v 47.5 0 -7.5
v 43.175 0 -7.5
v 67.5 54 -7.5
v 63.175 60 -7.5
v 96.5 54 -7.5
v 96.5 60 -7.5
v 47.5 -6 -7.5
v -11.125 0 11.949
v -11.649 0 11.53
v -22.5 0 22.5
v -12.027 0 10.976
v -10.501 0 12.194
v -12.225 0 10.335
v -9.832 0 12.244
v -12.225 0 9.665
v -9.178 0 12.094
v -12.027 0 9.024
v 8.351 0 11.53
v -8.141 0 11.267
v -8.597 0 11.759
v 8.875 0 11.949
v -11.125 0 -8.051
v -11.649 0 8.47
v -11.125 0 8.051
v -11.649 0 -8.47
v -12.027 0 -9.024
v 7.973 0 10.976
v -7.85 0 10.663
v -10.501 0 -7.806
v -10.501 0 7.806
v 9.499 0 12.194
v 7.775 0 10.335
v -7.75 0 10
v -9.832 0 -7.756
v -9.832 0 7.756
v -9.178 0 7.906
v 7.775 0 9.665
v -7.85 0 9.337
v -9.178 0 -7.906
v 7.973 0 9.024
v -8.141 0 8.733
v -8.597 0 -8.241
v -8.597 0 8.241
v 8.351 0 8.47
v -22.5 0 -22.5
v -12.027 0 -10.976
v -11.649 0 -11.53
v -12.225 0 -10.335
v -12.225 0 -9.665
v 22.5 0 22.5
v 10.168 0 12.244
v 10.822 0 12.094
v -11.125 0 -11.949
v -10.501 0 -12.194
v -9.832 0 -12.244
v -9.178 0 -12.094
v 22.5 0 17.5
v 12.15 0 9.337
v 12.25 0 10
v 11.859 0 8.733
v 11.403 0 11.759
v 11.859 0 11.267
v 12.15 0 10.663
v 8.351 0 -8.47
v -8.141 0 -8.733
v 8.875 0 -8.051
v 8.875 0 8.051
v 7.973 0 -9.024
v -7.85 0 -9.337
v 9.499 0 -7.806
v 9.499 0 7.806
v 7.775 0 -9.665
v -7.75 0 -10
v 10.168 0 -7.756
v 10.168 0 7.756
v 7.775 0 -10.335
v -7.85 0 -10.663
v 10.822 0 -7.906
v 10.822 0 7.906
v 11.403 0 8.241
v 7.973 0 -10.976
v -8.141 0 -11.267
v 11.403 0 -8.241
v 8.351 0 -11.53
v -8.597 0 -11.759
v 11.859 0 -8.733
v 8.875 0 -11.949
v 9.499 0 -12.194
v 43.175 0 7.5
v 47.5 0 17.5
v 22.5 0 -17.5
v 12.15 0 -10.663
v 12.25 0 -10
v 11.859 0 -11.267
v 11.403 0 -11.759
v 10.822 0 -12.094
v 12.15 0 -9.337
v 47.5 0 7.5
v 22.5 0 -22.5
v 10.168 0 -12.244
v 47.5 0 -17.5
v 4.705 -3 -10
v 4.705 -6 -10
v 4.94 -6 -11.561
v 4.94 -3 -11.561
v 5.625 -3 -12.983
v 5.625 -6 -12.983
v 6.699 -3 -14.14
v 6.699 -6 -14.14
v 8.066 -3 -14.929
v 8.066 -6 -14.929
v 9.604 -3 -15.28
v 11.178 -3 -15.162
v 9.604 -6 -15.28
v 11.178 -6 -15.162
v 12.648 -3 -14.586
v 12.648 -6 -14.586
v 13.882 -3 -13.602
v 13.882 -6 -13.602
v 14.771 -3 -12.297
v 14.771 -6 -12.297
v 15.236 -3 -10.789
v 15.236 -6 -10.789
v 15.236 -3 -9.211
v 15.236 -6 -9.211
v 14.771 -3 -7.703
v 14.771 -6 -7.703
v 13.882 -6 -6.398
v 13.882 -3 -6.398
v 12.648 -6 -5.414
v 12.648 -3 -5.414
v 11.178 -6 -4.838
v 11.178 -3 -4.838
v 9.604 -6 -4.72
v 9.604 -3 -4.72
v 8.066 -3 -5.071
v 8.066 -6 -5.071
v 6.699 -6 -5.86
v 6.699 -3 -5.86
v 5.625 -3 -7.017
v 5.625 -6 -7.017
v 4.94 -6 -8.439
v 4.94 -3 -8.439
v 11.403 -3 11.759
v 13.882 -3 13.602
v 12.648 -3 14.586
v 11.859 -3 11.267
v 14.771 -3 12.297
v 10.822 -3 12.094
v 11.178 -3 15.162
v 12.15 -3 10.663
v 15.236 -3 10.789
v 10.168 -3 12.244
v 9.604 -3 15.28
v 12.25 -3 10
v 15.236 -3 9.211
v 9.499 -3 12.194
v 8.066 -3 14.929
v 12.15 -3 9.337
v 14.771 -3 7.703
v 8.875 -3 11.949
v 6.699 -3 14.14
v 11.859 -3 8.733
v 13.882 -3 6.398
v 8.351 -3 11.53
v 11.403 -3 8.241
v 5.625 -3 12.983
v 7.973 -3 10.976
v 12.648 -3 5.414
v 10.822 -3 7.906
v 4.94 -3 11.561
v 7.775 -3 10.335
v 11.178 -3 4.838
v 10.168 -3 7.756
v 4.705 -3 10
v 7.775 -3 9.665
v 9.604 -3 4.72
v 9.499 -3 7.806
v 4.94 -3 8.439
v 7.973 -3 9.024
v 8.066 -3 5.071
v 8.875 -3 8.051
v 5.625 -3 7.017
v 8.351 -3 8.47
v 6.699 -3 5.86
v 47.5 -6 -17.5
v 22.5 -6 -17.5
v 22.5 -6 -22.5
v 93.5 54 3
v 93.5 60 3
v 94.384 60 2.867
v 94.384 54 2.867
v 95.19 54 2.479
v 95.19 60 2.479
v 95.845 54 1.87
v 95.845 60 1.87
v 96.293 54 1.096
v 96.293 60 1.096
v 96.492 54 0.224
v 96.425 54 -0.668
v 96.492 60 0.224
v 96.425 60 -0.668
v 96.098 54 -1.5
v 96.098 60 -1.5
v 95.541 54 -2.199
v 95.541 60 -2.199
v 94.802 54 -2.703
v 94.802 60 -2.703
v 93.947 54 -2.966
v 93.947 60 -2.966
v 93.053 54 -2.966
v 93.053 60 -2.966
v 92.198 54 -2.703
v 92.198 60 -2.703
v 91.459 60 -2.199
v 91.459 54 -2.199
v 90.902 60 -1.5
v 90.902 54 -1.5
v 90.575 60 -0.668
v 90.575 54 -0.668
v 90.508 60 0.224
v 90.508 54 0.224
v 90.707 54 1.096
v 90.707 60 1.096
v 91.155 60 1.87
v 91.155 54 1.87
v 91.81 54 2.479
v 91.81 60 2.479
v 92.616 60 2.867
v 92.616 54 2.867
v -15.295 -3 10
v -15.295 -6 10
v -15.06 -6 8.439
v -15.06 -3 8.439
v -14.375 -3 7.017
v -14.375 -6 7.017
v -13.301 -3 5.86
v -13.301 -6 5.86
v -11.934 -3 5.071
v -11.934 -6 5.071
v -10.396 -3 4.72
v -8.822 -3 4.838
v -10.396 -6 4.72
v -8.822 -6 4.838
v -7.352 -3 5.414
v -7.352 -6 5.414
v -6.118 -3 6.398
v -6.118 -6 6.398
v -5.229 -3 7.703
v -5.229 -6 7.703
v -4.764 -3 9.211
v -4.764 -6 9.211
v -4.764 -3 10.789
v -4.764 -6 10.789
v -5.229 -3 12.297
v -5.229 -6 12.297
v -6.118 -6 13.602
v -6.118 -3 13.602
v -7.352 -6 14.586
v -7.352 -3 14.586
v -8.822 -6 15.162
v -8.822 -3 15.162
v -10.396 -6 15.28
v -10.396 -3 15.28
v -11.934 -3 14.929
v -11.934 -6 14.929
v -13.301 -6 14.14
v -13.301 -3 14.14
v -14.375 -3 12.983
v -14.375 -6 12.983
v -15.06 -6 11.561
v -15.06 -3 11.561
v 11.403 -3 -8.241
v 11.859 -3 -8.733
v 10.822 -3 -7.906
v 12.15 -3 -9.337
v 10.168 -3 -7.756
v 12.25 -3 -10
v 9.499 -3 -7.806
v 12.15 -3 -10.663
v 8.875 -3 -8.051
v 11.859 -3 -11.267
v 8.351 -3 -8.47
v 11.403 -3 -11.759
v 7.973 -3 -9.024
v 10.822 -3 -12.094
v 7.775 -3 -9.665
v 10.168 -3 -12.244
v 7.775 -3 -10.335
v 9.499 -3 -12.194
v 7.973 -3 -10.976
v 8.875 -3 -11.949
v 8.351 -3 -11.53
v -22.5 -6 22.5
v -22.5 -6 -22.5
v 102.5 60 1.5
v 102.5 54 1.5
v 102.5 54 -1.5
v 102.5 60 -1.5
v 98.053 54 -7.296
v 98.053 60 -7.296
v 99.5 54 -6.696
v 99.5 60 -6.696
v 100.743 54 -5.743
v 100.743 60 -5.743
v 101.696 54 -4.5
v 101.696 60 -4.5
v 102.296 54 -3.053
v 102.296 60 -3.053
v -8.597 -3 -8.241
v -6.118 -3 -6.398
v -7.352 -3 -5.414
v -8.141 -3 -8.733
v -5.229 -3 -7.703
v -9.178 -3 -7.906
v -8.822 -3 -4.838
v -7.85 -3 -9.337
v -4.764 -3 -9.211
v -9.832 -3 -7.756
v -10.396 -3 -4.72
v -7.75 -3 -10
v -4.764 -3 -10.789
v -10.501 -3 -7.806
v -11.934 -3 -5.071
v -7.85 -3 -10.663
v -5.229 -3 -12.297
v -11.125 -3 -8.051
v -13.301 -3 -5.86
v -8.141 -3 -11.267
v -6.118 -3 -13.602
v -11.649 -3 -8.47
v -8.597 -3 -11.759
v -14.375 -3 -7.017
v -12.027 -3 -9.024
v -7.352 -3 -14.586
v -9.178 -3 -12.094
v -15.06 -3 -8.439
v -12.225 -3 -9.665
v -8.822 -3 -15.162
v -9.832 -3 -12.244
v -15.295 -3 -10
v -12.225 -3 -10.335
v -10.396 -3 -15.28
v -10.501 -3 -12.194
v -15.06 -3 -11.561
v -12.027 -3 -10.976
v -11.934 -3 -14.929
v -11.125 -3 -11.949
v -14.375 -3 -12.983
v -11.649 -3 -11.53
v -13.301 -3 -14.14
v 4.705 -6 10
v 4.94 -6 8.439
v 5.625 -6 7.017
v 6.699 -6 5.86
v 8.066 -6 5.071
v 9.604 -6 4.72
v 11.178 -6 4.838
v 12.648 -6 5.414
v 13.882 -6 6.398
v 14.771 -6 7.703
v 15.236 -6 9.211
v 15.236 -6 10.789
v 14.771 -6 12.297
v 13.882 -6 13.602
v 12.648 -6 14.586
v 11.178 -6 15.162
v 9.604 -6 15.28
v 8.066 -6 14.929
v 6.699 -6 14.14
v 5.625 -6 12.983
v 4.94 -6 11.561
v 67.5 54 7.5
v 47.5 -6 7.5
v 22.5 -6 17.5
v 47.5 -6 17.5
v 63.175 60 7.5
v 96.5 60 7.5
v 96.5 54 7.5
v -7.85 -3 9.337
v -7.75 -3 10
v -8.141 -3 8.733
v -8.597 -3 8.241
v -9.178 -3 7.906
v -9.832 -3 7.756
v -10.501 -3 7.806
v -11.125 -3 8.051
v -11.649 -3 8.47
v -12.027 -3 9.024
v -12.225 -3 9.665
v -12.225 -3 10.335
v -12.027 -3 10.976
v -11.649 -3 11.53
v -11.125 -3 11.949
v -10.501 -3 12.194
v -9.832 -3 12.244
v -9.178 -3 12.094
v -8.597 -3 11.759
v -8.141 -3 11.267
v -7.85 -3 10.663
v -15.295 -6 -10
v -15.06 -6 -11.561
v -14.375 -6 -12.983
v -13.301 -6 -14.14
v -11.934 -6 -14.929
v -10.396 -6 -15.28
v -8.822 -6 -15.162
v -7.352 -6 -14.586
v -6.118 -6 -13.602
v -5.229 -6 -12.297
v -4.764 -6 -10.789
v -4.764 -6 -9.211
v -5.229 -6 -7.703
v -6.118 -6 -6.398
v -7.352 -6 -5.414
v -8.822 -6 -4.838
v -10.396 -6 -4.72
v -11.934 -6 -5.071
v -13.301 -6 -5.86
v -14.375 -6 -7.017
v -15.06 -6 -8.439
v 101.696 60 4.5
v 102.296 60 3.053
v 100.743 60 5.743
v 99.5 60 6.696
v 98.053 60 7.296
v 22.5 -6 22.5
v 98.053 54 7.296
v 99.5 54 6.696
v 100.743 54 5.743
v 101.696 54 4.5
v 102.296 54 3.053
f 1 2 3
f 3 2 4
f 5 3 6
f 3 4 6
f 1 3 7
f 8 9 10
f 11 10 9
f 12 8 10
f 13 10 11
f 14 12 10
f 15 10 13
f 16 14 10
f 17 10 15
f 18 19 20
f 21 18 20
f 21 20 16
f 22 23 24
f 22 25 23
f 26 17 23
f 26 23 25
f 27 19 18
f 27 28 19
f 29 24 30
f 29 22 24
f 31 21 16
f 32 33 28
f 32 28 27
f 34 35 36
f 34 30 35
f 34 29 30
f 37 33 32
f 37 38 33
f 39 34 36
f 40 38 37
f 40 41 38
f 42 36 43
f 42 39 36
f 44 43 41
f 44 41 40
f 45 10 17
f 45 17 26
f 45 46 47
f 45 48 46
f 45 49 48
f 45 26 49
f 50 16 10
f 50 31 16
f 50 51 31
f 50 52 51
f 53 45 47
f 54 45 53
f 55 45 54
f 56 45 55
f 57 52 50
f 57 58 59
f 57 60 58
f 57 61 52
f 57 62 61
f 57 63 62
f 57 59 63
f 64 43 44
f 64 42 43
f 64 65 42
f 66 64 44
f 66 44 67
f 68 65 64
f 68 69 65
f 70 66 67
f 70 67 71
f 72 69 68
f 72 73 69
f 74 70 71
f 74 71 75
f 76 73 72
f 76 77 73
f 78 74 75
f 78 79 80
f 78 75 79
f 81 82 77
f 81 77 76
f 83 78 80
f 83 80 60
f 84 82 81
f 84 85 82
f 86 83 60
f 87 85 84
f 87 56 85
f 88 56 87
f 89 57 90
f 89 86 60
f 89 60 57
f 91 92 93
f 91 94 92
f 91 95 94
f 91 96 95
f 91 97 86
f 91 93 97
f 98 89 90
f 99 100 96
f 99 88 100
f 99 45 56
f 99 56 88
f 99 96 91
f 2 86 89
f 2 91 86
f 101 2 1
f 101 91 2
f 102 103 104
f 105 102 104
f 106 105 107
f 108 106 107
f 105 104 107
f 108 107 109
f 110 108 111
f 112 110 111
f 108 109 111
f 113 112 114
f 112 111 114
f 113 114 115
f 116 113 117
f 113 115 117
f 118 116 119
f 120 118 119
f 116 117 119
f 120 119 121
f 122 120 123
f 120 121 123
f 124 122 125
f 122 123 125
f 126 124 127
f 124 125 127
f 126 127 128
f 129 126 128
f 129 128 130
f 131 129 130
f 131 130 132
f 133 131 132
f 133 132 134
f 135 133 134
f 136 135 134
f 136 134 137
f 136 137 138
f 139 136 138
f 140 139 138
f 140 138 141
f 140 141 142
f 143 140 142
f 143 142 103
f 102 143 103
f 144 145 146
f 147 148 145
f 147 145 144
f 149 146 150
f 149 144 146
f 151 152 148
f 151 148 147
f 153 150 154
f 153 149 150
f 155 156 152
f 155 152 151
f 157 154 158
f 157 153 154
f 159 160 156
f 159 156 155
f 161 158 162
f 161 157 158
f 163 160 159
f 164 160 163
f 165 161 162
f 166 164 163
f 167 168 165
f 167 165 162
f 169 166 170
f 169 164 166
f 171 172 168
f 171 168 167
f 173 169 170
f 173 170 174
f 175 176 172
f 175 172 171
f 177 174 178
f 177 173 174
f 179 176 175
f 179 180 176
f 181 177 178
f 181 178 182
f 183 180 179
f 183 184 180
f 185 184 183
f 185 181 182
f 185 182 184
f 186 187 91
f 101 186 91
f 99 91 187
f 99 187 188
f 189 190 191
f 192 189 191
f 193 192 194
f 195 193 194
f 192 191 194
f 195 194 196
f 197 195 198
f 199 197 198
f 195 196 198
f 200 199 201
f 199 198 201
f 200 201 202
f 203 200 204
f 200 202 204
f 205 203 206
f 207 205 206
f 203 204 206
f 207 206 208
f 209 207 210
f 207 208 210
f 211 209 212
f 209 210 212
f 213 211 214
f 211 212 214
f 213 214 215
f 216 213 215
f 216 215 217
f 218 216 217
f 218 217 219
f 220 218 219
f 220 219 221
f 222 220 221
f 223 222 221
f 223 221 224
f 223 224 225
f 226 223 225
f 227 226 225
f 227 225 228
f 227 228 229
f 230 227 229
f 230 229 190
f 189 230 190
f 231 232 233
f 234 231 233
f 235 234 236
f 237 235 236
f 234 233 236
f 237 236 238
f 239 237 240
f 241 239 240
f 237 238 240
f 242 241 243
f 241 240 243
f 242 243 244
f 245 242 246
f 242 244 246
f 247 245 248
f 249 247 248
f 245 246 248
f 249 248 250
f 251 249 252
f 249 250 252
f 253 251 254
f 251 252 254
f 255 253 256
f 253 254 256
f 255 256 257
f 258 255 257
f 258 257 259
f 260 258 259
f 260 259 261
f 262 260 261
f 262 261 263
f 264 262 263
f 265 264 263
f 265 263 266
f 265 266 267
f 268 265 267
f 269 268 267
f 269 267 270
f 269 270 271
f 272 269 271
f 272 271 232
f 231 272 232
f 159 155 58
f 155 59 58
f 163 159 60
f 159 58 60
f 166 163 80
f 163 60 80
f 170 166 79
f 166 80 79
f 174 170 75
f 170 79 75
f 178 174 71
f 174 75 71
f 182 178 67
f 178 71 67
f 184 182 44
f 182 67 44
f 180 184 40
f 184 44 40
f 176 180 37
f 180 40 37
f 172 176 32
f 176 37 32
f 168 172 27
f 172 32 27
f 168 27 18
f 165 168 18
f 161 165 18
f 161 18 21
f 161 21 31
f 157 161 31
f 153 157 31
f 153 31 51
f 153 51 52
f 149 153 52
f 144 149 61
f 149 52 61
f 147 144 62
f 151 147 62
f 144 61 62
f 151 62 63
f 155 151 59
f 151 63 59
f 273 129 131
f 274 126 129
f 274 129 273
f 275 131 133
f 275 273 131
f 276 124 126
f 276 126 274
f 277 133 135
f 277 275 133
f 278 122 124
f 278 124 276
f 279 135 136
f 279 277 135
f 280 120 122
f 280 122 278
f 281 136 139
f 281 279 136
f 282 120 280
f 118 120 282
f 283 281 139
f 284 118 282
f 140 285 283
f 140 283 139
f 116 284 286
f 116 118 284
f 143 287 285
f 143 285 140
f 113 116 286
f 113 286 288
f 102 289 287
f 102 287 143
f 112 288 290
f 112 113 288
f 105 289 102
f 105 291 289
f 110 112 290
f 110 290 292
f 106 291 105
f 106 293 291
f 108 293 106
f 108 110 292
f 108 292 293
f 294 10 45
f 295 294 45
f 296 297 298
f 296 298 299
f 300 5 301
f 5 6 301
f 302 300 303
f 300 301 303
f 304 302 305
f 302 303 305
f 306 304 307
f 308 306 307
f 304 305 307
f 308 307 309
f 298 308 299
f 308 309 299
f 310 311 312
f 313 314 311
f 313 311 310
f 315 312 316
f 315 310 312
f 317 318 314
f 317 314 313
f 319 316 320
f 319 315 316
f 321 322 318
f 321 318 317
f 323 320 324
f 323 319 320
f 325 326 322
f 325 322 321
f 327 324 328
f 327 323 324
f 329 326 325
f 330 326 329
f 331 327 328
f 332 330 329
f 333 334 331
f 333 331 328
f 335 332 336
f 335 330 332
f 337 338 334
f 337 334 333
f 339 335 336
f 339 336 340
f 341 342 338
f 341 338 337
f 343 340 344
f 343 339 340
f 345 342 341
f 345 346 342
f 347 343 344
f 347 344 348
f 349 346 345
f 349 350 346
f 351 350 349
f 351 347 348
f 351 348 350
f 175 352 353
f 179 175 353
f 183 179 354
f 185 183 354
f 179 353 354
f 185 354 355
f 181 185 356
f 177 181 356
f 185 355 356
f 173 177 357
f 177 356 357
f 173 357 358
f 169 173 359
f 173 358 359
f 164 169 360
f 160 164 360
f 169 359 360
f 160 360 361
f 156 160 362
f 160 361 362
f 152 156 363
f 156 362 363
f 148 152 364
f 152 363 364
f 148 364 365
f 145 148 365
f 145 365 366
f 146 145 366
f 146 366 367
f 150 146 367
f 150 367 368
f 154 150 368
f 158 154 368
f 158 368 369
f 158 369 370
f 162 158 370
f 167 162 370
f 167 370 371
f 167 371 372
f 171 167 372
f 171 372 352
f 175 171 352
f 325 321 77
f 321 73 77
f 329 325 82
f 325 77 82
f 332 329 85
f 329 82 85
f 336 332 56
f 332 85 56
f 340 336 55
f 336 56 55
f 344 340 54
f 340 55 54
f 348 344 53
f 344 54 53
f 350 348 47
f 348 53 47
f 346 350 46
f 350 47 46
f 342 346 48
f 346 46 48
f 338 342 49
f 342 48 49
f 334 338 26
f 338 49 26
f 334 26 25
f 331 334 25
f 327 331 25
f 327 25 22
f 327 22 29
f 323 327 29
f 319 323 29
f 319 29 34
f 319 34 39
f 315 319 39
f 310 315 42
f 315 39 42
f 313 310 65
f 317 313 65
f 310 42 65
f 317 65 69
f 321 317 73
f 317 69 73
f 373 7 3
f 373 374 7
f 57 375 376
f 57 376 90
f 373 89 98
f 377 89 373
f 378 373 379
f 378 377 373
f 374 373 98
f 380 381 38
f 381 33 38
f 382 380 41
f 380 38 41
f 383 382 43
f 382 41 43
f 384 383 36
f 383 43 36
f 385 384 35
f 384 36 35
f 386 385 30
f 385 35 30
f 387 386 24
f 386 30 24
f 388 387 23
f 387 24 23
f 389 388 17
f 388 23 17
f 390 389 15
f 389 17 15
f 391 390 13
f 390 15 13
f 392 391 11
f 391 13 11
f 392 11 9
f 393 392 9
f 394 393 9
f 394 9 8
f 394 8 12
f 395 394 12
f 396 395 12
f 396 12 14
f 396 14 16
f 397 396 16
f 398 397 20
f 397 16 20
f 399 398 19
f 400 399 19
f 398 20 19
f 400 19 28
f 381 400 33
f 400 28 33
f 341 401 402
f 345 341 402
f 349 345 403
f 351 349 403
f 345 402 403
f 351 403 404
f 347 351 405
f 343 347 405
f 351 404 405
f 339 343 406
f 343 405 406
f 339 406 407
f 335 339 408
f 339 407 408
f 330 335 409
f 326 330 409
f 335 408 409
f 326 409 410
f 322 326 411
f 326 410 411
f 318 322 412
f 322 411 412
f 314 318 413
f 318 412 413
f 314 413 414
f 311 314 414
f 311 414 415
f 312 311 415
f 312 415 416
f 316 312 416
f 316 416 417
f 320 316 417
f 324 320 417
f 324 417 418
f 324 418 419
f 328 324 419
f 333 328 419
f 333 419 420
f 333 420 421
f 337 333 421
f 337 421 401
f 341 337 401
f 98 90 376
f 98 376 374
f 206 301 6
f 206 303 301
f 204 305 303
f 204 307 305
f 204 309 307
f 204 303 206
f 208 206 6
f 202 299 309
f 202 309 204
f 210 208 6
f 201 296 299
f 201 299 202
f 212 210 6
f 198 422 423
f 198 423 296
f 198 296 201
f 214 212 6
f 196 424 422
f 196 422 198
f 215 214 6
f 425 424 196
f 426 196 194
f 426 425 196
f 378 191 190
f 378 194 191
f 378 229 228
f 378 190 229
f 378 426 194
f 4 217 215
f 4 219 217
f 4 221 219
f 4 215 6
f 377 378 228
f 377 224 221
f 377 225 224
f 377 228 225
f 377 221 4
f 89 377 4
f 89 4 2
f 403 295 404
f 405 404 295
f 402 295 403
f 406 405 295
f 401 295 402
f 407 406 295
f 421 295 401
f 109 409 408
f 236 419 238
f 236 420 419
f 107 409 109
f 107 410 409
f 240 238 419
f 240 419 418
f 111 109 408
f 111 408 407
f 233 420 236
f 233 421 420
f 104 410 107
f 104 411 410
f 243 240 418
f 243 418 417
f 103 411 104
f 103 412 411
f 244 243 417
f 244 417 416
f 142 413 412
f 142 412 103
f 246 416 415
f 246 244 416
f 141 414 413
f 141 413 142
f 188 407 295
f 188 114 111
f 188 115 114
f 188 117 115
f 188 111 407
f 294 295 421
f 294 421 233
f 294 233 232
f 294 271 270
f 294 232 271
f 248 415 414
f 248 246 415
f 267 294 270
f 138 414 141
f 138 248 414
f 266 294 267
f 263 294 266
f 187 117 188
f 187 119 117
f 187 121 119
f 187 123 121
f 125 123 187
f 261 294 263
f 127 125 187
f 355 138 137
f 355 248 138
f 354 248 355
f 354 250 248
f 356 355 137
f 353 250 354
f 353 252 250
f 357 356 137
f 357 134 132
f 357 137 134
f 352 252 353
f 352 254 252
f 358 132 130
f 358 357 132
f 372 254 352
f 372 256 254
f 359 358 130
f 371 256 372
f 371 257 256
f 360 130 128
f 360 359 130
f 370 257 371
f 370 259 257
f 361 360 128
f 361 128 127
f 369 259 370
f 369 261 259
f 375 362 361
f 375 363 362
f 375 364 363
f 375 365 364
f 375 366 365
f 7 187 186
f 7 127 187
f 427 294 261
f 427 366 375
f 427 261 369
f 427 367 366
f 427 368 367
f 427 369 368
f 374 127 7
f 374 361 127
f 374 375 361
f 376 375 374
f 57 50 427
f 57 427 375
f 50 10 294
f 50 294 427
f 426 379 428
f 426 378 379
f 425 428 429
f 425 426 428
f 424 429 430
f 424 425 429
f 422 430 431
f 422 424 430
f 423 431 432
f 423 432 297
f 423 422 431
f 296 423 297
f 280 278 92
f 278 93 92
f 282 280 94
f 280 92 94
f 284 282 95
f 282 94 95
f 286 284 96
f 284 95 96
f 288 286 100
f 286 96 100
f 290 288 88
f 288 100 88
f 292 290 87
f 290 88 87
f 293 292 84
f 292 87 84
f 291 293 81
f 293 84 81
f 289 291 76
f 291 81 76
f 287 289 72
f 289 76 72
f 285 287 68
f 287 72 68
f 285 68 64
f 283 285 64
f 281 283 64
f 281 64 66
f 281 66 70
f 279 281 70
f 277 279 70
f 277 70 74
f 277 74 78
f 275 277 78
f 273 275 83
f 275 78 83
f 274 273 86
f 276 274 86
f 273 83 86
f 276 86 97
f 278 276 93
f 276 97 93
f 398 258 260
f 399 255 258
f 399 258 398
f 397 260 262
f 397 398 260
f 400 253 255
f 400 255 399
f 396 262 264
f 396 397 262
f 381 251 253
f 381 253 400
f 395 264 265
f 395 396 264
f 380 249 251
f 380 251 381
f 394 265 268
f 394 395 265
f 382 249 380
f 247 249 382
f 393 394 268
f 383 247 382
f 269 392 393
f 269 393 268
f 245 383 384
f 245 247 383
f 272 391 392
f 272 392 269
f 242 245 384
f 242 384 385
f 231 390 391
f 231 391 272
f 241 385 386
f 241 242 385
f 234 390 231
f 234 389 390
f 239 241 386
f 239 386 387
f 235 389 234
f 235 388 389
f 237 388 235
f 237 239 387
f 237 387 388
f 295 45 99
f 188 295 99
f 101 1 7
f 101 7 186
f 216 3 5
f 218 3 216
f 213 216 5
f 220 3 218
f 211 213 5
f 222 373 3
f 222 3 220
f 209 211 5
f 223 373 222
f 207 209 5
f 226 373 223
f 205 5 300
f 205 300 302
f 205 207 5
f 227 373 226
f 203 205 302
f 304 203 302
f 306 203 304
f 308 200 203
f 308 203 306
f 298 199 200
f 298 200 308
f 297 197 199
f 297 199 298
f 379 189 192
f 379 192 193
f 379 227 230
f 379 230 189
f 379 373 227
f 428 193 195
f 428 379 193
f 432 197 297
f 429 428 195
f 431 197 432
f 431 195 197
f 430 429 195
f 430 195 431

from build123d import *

# Parameters (mm, degrees)
SKETCH1_W                                        = 45
SKETCH1_H                                        = 45
BASE_DEPTH                                       = 6
CBORE_FOR_M4_HEX_HEAD_MACHINE_SCREW1_D           = 4.5
CBORE_FOR_M4_HEX_HEAD_MACHINE_SCREW1_CBORE_D     = 10.59
CBORE_FOR_M4_HEX_HEAD_MACHINE_SCREW1_CBORE_DEPTH = 3
SKETCH4_W                                        = 35
SKETCH4_H                                        = 6
STANDING_PLATFORM_DEPTH                          = 25
FRONT_ARM_DEPTH                                  = 7.5
SKETCH6_R                                        = 3
STEERING_HOLE_DEPTH                              = 15
FILLET1_R                                        = 6


with BuildPart() as part:
    # Sketch1 → BASE (new body)
    with BuildSketch(Plane(origin=(0, 0, 0), x_dir=(1, 0, 0), z_dir=(0, 1, 0))):
        Rectangle(SKETCH1_W, SKETCH1_H)
    extrude(amount=-BASE_DEPTH)

    # CBORE for M4 Hex Head Machine Screw1 (through all)
    with Locations(Plane(origin=(0, -6, 0), x_dir=(-1, 0, 0), z_dir=(0, -1, 0))):
        with Locations((10, -10), (-10, -10), (-10, 10), (10, 10)):
            CounterBoreHole(CBORE_FOR_M4_HEX_HEAD_MACHINE_SCREW1_D / 2, CBORE_FOR_M4_HEX_HEAD_MACHINE_SCREW1_CBORE_D / 2, CBORE_FOR_M4_HEX_HEAD_MACHINE_SCREW1_CBORE_DEPTH)

    # Sketch4 → Standing Platform (add)
    with BuildSketch(Plane(origin=(22.5, 0, 0), x_dir=(0, 0, -1), z_dir=(1, 0, 0))):
        with Locations((0, -3)):
            Rectangle(SKETCH4_W, SKETCH4_H)
    extrude(amount=STANDING_PLATFORM_DEPTH)

    # Sketch5 → Front Arm (add, symmetric)
    with BuildSketch(Plane.XY):
        Polygon((47.5, -6), (67.5, 54), (102.5, 54), (102.5, 60), (63.17544468, 60), (41.17544468, -6), align=None)
    extrude(amount=FRONT_ARM_DEPTH, both=True)

    # Sketch6 → Steering Hole (cut)
    with BuildSketch(Plane(origin=(0, 60, 0), x_dir=(1, 0, 0), z_dir=(0, 1, 0))):
        with Locations(Location((93.5, 0, 0), (0, 0, 270))):
            Circle(SKETCH6_R)
    extrude(amount=-STEERING_HOLE_DEPTH, mode=Mode.SUBTRACT)

    # Fillet1
    fillet1_edges = [part.edges().sort_by_distance(p)[0] for p in [
        (102.5, 57, 7.5),
        (102.5, 57, -7.5),
    ]]
    fillet(fillet1_edges, radius=FILLET1_R)


solid = part.part
